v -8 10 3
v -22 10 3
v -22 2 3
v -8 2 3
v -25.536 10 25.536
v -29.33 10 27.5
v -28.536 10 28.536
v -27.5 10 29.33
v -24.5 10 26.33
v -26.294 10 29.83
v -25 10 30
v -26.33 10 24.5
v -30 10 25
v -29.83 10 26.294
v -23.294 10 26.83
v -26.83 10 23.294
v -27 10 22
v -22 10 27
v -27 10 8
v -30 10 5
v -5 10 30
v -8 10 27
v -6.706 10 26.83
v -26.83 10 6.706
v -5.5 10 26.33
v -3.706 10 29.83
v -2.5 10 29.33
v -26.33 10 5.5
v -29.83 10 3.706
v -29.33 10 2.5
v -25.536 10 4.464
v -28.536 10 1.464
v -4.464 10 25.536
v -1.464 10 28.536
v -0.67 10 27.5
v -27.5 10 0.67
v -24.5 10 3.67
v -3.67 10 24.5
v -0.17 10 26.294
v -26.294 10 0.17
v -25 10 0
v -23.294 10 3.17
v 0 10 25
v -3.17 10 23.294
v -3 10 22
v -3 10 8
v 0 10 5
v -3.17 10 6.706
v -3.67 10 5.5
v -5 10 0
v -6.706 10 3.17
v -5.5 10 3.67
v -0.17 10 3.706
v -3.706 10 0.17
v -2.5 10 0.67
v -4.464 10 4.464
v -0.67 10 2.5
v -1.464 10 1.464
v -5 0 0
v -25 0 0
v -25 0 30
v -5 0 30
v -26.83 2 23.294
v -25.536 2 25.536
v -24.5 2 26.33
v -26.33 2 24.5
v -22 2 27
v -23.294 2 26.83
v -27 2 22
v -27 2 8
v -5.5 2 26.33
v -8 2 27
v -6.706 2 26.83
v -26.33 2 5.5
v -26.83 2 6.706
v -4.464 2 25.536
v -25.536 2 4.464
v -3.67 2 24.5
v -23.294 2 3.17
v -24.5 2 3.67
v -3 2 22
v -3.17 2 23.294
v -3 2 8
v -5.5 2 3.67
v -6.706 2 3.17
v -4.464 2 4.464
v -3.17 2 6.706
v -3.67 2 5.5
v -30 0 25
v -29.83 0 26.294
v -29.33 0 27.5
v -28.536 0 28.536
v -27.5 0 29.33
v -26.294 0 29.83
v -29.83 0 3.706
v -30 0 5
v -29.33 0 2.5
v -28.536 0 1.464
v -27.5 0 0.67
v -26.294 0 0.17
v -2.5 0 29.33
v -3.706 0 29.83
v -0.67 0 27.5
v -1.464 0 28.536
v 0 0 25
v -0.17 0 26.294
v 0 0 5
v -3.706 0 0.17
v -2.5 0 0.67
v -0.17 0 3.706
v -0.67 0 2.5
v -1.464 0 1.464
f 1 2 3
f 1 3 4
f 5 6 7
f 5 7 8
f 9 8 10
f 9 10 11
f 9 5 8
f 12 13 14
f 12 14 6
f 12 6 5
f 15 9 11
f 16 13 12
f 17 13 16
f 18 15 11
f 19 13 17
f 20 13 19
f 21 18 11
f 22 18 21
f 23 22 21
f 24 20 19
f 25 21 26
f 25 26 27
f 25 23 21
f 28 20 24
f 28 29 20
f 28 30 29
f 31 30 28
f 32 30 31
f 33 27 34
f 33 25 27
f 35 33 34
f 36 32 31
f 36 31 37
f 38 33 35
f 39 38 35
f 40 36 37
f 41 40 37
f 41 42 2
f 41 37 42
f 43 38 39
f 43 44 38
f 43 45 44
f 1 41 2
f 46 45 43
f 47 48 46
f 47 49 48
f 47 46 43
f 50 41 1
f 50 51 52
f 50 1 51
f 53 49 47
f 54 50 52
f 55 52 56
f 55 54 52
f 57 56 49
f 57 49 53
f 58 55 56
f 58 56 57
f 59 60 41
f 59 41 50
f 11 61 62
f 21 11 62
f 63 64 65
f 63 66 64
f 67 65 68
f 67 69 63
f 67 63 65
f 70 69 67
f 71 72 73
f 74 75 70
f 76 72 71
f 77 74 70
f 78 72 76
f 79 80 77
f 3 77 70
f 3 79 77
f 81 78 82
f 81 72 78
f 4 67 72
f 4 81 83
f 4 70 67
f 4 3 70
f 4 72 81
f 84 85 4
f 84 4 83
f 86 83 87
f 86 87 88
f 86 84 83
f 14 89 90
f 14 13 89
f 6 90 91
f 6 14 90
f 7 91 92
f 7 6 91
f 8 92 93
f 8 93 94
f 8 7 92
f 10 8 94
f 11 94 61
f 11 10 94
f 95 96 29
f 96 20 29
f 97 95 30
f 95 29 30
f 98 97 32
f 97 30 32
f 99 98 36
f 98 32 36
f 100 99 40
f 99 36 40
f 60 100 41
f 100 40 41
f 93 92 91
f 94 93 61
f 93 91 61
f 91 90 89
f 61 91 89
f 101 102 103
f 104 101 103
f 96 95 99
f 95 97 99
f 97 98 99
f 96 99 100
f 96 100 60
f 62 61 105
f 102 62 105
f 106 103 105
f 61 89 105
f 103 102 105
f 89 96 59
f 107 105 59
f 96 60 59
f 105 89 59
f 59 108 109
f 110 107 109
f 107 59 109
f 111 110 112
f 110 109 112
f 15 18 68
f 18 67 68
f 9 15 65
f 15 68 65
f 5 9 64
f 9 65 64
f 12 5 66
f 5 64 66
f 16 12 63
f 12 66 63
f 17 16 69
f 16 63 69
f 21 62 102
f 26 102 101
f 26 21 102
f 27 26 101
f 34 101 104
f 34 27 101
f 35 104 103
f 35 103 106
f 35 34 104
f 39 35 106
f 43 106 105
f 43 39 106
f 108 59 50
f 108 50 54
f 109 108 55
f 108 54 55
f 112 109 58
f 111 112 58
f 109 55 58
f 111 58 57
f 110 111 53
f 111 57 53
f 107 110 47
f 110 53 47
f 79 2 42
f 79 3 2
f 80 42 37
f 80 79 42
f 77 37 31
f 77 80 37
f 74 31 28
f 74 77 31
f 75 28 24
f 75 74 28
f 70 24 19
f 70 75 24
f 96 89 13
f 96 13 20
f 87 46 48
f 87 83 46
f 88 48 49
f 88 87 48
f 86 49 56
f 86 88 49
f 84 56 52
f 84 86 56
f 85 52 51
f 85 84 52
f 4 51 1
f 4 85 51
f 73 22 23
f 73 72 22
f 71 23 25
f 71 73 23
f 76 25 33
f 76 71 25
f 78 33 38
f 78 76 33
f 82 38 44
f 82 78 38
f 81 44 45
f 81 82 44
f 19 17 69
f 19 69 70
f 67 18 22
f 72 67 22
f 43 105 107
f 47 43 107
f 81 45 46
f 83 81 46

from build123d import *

# Parameters (mm, degrees)
SKETCH2_W           = 30
SKETCH2_H           = 30
BOSS_EXTRUDE1_DEPTH = 10
SKETCH4_W           = 24
SKETCH4_H           = 24
CUT_EXTRUDE1_DEPTH  = 8
FILLET1_R           = 5
FILLET2_R           = 5


with BuildPart() as part:
    # Sketch2 → Boss-Extrude1 (new body)
    with BuildSketch(Plane(origin=(0, 0, 0), x_dir=(1, 0, 0), z_dir=(0, 1, 0))):
        with Locations((-15, -15)):
            Rectangle(SKETCH2_W, SKETCH2_H)
    extrude(amount=BOSS_EXTRUDE1_DEPTH)

    # Sketch4 → Cut-Extrude1 (cut)
    with BuildSketch(Plane(origin=(0, 10, 0), x_dir=(1, 0, 0), z_dir=(0, 1, 0))):
        with Locations((-15, -15)):
            Rectangle(SKETCH4_W, SKETCH4_H)
    extrude(amount=-CUT_EXTRUDE1_DEPTH, mode=Mode.SUBTRACT)

    # Fillet1
    fillet1_edges = [part.edges().sort_by_distance(p)[0] for p in [
        (0, 5, 30),
        (-30, 5, 30),
        (-30, 5, 0),
        (0, 5, 0),
    ]]
    fillet(fillet1_edges, radius=FILLET1_R)

    # Fillet2
    fillet2_edges = [part.edges().sort_by_distance(p)[0] for p in [
        (-27, 6, 27),
        (-27, 6, 3),
        (-3, 6, 3),
        (-3, 6, 27),
    ]]
    fillet(fillet2_edges, radius=FILLET2_R)


solid = part.part
